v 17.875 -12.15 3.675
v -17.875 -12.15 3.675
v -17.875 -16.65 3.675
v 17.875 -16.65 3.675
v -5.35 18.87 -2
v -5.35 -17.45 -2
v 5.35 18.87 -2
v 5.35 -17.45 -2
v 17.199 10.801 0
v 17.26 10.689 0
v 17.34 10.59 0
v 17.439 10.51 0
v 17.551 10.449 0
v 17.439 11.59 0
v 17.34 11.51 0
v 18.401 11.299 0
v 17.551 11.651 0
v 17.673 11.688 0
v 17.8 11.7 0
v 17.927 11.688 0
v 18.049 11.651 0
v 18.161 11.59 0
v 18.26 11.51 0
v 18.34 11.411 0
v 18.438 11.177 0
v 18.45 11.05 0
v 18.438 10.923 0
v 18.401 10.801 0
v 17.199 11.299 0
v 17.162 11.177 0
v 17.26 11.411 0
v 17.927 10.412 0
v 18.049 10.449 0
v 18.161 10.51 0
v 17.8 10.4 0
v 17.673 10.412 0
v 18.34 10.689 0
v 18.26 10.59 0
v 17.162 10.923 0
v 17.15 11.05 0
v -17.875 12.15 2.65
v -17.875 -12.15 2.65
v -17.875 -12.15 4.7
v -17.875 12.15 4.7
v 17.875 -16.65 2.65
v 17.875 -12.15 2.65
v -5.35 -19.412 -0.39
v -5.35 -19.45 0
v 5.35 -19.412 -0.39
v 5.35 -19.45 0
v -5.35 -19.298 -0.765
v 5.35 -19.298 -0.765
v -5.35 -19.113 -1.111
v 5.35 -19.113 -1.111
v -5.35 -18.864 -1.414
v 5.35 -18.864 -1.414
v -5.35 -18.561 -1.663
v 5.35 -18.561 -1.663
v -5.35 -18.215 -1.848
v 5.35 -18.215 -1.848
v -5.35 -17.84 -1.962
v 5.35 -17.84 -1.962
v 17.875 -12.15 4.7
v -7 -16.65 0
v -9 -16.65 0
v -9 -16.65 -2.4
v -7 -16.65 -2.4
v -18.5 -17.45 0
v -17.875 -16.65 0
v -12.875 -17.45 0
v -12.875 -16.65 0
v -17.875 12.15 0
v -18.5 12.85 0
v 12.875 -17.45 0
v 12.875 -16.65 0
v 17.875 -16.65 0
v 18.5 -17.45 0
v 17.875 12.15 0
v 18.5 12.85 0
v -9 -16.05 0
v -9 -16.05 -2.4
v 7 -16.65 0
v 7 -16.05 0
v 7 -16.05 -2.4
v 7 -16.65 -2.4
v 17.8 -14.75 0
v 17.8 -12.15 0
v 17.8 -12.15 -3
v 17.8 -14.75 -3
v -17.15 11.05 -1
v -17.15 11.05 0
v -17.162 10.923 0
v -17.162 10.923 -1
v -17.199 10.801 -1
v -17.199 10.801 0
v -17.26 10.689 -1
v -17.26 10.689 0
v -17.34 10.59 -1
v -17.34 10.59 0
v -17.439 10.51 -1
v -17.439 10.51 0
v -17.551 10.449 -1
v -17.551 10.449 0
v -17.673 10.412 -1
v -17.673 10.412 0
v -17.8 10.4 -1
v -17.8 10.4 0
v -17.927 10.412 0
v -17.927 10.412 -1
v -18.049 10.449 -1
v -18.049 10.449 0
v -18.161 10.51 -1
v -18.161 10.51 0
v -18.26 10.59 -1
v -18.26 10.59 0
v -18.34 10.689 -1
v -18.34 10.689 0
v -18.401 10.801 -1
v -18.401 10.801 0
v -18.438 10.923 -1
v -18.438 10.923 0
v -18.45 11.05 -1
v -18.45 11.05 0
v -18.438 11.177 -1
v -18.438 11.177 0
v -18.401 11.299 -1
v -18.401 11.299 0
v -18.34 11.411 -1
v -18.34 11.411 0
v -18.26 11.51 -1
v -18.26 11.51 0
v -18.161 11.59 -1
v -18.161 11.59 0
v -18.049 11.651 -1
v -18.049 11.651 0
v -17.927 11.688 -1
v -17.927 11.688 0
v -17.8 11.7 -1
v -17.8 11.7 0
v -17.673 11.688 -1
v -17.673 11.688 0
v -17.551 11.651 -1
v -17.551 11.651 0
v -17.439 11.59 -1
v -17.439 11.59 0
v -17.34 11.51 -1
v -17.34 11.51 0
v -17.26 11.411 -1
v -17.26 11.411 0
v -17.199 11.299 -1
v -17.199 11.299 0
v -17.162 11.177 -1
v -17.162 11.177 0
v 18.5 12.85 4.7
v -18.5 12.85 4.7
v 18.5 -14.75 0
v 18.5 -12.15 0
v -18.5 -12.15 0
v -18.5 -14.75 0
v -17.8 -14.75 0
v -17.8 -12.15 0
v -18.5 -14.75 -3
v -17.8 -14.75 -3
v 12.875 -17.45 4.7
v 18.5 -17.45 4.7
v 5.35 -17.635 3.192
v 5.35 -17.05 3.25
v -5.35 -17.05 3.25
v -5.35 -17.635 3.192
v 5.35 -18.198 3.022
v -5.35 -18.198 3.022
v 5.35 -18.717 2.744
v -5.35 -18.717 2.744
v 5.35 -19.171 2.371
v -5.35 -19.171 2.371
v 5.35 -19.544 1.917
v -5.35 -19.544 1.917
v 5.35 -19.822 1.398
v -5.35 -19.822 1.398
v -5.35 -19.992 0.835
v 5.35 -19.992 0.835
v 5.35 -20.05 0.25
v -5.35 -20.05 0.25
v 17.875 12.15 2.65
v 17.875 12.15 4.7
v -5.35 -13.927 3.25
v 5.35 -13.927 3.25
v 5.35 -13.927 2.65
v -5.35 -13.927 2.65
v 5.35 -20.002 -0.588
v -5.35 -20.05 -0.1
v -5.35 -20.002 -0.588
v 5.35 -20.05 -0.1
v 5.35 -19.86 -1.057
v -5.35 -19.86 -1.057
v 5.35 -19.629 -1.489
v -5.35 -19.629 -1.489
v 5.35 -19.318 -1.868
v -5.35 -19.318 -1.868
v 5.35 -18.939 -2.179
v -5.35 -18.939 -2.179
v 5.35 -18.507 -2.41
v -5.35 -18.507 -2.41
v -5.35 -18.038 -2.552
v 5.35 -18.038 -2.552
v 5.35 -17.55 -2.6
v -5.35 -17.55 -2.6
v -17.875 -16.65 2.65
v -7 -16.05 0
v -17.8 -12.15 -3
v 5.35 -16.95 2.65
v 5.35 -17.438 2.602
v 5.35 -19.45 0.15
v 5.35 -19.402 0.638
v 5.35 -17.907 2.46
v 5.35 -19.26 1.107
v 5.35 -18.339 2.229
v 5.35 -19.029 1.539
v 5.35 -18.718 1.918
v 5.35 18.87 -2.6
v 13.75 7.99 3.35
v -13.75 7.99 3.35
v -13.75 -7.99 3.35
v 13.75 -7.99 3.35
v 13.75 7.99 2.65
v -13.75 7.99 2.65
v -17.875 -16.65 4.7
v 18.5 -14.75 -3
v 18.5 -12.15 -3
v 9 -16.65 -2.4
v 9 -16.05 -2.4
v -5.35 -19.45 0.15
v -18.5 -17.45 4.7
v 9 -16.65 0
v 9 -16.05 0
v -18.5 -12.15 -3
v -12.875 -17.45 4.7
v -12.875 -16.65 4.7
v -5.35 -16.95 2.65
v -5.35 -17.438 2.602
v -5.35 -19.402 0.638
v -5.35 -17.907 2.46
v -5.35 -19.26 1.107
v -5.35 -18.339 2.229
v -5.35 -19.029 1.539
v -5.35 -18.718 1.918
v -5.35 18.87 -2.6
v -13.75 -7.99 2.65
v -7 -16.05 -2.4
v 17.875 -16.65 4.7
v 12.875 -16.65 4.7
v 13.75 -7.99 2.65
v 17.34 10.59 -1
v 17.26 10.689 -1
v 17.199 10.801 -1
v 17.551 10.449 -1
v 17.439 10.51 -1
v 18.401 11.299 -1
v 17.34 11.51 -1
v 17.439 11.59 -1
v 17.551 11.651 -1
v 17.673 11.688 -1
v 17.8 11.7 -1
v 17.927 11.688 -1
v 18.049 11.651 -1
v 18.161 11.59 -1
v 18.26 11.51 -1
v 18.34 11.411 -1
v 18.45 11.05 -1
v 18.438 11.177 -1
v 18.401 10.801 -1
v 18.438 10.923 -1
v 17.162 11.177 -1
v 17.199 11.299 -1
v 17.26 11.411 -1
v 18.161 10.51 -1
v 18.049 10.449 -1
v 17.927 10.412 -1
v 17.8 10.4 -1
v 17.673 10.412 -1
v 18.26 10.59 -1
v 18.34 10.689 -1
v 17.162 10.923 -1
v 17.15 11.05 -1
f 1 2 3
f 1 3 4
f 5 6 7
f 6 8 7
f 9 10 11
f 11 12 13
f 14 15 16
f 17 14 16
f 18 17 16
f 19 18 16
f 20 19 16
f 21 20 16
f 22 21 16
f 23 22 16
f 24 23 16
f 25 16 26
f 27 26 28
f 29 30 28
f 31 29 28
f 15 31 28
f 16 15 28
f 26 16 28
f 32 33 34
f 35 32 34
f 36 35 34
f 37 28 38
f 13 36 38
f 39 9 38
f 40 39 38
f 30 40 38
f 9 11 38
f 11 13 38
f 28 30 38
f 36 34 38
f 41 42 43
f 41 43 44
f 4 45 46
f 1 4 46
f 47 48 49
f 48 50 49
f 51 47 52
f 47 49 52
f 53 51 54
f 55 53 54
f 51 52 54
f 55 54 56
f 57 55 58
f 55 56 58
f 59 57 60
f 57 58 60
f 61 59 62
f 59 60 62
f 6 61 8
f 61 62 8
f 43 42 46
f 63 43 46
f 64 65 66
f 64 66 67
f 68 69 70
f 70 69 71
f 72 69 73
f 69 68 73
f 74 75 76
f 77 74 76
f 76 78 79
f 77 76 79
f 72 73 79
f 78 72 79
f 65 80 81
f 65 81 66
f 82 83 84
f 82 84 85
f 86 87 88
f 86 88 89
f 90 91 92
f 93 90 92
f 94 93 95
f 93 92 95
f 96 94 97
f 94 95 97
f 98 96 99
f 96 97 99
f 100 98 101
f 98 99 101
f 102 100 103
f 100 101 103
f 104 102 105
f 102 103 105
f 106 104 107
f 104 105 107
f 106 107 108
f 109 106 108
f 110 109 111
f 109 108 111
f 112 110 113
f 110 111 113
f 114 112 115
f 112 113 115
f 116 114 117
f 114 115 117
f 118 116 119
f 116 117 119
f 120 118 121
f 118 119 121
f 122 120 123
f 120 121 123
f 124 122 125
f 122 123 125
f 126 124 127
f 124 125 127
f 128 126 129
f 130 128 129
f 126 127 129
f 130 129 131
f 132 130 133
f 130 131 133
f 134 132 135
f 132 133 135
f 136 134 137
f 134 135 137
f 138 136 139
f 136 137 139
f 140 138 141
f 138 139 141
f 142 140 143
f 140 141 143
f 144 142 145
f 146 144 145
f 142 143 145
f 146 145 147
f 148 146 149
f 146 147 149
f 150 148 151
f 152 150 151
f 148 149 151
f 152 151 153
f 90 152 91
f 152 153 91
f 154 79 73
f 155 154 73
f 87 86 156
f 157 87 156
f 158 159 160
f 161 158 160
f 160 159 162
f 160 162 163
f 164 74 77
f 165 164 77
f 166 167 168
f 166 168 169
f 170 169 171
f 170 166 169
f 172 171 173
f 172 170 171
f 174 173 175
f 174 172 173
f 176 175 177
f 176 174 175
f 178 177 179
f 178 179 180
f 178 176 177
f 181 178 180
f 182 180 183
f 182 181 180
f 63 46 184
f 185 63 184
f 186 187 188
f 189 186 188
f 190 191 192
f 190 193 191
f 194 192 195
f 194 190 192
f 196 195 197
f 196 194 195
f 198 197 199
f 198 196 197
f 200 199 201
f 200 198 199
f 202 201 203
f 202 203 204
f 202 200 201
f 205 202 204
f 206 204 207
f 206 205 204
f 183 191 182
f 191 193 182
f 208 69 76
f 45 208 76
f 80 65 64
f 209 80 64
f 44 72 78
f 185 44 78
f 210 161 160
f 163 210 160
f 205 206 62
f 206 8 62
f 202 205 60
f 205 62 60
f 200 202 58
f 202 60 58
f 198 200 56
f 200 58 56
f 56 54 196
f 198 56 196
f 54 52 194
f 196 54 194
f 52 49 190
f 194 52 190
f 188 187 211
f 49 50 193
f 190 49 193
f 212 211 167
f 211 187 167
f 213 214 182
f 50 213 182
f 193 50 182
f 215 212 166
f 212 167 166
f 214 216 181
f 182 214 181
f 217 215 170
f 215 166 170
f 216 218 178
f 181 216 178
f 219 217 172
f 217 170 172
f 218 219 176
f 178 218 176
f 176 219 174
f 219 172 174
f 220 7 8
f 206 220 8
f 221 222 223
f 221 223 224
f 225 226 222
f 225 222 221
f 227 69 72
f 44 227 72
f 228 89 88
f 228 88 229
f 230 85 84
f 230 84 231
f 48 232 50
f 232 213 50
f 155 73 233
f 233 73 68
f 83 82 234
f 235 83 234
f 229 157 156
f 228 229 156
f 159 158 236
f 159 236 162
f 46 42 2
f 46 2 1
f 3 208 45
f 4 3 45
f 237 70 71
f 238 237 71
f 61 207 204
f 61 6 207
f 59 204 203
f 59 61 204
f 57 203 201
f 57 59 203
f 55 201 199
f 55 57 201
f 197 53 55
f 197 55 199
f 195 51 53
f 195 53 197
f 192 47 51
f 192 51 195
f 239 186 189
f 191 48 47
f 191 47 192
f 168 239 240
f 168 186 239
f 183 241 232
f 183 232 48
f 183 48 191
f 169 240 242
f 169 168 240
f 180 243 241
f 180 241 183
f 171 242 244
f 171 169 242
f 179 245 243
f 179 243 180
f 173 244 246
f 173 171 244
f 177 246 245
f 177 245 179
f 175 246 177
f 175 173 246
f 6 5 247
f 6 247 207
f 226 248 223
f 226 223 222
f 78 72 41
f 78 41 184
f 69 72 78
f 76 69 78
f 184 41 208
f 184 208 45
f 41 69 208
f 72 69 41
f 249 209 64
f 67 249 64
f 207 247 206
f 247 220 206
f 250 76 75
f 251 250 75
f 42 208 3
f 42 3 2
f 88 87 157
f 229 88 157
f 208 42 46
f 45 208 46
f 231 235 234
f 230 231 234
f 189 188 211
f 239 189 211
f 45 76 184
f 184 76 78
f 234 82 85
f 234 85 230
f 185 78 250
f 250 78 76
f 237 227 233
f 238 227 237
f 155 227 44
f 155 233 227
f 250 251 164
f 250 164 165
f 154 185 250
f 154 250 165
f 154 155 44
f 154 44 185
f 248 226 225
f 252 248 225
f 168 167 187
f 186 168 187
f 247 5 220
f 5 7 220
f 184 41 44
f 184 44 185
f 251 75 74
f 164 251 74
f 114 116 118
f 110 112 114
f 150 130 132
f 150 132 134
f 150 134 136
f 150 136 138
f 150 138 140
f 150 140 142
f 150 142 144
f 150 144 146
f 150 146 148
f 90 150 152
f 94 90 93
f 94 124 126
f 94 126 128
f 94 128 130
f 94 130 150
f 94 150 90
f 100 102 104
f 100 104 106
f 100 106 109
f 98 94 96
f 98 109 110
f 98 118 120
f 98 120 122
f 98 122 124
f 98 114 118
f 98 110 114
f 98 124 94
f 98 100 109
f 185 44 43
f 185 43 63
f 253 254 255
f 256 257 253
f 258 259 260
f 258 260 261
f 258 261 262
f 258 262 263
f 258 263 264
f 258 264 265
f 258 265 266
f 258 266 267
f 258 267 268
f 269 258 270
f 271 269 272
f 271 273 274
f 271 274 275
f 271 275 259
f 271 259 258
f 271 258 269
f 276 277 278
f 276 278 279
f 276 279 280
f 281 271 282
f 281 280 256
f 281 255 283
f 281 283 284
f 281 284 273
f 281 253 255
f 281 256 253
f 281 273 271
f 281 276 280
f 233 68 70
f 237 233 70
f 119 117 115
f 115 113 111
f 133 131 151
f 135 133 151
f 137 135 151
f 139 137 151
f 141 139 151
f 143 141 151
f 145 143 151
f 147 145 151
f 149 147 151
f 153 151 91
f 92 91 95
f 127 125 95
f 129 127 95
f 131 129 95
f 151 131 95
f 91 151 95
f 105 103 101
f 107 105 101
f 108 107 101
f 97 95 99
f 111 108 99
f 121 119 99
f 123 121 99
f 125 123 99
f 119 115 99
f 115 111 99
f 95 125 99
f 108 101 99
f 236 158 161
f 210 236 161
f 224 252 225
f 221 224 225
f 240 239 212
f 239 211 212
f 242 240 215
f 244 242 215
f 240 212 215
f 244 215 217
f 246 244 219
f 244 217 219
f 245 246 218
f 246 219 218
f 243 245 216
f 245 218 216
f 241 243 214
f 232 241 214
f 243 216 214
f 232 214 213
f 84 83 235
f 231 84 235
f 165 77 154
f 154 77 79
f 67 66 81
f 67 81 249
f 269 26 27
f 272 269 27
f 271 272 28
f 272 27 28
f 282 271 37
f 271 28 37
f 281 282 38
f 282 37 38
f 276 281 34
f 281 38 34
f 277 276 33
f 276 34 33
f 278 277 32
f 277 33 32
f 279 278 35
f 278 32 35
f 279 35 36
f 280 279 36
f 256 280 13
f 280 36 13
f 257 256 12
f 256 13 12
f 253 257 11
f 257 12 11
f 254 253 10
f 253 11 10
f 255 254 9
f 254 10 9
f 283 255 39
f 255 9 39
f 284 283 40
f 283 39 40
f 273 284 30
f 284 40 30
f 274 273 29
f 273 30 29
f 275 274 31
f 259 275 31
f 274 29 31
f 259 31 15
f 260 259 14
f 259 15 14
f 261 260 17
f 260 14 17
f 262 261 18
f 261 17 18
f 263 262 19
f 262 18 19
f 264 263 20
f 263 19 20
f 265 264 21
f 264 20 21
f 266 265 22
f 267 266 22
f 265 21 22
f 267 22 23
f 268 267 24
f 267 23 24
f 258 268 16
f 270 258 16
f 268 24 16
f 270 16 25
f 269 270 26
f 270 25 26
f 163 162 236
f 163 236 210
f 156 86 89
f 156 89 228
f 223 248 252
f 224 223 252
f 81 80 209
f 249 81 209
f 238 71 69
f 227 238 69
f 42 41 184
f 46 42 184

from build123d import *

# Parameters (mm, degrees)
SKETCH_W     = 35.75
SKETCH_H     = 28.8
PAD_DEPTH    = 2.65
PAD001_DEPTH = 4.7
SKETCH002_W  = 27.5
SKETCH002_H  = 15.98
PAD002_DEPTH = 0.7
SKETCH003_W  = 35.75
SKETCH003_H  = 24.3
PAD003_DEPTH = 2.05
SKETCH004_W  = 35.75
SKETCH004_H  = 4.5
PAD004_DEPTH = 1.025
SKETCH005_R  = 0.65
PAD005_DEPTH = 1
SKETCH006_W  = 2
SKETCH006_H  = 0.6
PAD006_DEPTH = 2.4
SKETCH007_W  = 0.7
SKETCH007_H  = 2.6
PAD007_DEPTH = 3
PAD008_DEPTH = 5.35


with BuildPart() as pcb:
    # Sketch → Pad (new body)
    with BuildSketch(Plane.XY):
        with Locations((0, -2.25)):
            Rectangle(SKETCH_W, SKETCH_H)
    extrude(amount=PAD_DEPTH)


with BuildPart() as ramka001:
    # Sketch001 → Pad001 (new body)
    with BuildSketch(Plane.XY):
        Polygon((-17.875, 12.15), (17.875, 12.15), (17.875, -16.65), (12.875, -16.65), (12.875, -17.45), (18.5, -17.45), (18.5, 12.85), (-18.5, 12.85), (-18.5, -17.45), (-12.875, -17.45), (-12.875, -16.65), (-17.875, -16.65), align=None)
    extrude(amount=PAD001_DEPTH)


with BuildPart() as ekran001:
    # Sketch002 → Pad002 (new body)
    with BuildSketch(Plane.XY.offset(2.65)):
        Rectangle(SKETCH002_W, SKETCH002_H)
    extrude(amount=PAD002_DEPTH)


with BuildPart() as zabezpieczenie_ekranu001:
    # Sketch003 → Pad003 (new body)
    with BuildSketch(Plane.XY.offset(2.65)):
        Rectangle(SKETCH003_W, SKETCH003_H)
    extrude(amount=PAD003_DEPTH)


with BuildPart() as czarna_masa001:
    # Sketch004 → Pad004 (new body)
    with BuildSketch(Plane.XY.offset(2.65)):
        with Locations((0, -14.4)):
            Rectangle(SKETCH004_W, SKETCH004_H)
    extrude(amount=PAD004_DEPTH)


with BuildPart() as piny_montazowe001:
    # Sketch005 → Pad005 (new body)
    with BuildSketch(Plane(origin=(0, 0, 0), x_dir=(1, 0, 0), z_dir=(0, 0, -1))):
        with Locations((-17.8, -11.05)):
            Circle(SKETCH005_R)
        with Locations((17.8, -11.05)):
            Circle(SKETCH005_R)
    extrude(amount=PAD005_DEPTH)


with BuildPart() as katoda_anoda001:
    # Sketch006 → Pad006 (new body)
    with BuildSketch(Plane(origin=(0, 0, 0), x_dir=(1, 0, 0), z_dir=(0, 0, -1))):
        with Locations((-8, 16.35)):
            Rectangle(SKETCH006_W, SKETCH006_H)
        with Locations((8, 16.35)):
            Rectangle(SKETCH006_W, SKETCH006_H)
    extrude(amount=PAD006_DEPTH)


with BuildPart() as piny_montazowe003:
    # Sketch007 → Pad007 (new body)
    with BuildSketch(Plane(origin=(0, 0, 0), x_dir=(1, 0, 0), z_dir=(0, 0, -1))):
        with Locations((18.15, 13.45)):
            Rectangle(SKETCH007_W, SKETCH007_H)
        with Locations((-18.15, 13.45)):
            Rectangle(SKETCH007_W, SKETCH007_H)
    extrude(amount=PAD007_DEPTH)


with BuildPart() as pasek001:
    # Sketch008 → Pad008 (new body, symmetric)
    with BuildSketch(Plane.YZ):
        with BuildLine():
            Line((-13.926651, 2.65), (-16.95, 2.65))
            ThreePointArc((-16.95, 2.65), (-18.717767, 1.917767), (-19.45, 0.15))
            Line((-19.45, 0.15), (-19.45, 0))
            ThreePointArc((-19.45, 0), (-18.864214, -1.414214), (-17.45, -2))
            Line((-17.45, -2), (18.87, -2))
            Line((18.87, -2), (18.87, -2.6))
            Line((18.87, -2.6), (-17.55, -2.6))
            ThreePointArc((-20.05, -0.1), (-19.317767, -1.867767), (-17.55, -2.6))
            Line((-20.05, -0.1), (-20.05, 0.25))
            ThreePointArc((-17.05, 3.25), (-19.17132, 2.37132), (-20.05, 0.25))
            Line((-17.05, 3.25), (-13.926651, 3.25))
            Line((-13.926651, 3.25), (-13.926651, 2.65))
        make_face()
    extrude(amount=PAD008_DEPTH, both=True)


solid = Compound([pcb.part, ramka001.part, ekran001.part, zabezpieczenie_ekranu001.part, czarna_masa001.part, piny_montazowe001.part, katoda_anoda001.part, piny_montazowe003.part, pasek001.part])
